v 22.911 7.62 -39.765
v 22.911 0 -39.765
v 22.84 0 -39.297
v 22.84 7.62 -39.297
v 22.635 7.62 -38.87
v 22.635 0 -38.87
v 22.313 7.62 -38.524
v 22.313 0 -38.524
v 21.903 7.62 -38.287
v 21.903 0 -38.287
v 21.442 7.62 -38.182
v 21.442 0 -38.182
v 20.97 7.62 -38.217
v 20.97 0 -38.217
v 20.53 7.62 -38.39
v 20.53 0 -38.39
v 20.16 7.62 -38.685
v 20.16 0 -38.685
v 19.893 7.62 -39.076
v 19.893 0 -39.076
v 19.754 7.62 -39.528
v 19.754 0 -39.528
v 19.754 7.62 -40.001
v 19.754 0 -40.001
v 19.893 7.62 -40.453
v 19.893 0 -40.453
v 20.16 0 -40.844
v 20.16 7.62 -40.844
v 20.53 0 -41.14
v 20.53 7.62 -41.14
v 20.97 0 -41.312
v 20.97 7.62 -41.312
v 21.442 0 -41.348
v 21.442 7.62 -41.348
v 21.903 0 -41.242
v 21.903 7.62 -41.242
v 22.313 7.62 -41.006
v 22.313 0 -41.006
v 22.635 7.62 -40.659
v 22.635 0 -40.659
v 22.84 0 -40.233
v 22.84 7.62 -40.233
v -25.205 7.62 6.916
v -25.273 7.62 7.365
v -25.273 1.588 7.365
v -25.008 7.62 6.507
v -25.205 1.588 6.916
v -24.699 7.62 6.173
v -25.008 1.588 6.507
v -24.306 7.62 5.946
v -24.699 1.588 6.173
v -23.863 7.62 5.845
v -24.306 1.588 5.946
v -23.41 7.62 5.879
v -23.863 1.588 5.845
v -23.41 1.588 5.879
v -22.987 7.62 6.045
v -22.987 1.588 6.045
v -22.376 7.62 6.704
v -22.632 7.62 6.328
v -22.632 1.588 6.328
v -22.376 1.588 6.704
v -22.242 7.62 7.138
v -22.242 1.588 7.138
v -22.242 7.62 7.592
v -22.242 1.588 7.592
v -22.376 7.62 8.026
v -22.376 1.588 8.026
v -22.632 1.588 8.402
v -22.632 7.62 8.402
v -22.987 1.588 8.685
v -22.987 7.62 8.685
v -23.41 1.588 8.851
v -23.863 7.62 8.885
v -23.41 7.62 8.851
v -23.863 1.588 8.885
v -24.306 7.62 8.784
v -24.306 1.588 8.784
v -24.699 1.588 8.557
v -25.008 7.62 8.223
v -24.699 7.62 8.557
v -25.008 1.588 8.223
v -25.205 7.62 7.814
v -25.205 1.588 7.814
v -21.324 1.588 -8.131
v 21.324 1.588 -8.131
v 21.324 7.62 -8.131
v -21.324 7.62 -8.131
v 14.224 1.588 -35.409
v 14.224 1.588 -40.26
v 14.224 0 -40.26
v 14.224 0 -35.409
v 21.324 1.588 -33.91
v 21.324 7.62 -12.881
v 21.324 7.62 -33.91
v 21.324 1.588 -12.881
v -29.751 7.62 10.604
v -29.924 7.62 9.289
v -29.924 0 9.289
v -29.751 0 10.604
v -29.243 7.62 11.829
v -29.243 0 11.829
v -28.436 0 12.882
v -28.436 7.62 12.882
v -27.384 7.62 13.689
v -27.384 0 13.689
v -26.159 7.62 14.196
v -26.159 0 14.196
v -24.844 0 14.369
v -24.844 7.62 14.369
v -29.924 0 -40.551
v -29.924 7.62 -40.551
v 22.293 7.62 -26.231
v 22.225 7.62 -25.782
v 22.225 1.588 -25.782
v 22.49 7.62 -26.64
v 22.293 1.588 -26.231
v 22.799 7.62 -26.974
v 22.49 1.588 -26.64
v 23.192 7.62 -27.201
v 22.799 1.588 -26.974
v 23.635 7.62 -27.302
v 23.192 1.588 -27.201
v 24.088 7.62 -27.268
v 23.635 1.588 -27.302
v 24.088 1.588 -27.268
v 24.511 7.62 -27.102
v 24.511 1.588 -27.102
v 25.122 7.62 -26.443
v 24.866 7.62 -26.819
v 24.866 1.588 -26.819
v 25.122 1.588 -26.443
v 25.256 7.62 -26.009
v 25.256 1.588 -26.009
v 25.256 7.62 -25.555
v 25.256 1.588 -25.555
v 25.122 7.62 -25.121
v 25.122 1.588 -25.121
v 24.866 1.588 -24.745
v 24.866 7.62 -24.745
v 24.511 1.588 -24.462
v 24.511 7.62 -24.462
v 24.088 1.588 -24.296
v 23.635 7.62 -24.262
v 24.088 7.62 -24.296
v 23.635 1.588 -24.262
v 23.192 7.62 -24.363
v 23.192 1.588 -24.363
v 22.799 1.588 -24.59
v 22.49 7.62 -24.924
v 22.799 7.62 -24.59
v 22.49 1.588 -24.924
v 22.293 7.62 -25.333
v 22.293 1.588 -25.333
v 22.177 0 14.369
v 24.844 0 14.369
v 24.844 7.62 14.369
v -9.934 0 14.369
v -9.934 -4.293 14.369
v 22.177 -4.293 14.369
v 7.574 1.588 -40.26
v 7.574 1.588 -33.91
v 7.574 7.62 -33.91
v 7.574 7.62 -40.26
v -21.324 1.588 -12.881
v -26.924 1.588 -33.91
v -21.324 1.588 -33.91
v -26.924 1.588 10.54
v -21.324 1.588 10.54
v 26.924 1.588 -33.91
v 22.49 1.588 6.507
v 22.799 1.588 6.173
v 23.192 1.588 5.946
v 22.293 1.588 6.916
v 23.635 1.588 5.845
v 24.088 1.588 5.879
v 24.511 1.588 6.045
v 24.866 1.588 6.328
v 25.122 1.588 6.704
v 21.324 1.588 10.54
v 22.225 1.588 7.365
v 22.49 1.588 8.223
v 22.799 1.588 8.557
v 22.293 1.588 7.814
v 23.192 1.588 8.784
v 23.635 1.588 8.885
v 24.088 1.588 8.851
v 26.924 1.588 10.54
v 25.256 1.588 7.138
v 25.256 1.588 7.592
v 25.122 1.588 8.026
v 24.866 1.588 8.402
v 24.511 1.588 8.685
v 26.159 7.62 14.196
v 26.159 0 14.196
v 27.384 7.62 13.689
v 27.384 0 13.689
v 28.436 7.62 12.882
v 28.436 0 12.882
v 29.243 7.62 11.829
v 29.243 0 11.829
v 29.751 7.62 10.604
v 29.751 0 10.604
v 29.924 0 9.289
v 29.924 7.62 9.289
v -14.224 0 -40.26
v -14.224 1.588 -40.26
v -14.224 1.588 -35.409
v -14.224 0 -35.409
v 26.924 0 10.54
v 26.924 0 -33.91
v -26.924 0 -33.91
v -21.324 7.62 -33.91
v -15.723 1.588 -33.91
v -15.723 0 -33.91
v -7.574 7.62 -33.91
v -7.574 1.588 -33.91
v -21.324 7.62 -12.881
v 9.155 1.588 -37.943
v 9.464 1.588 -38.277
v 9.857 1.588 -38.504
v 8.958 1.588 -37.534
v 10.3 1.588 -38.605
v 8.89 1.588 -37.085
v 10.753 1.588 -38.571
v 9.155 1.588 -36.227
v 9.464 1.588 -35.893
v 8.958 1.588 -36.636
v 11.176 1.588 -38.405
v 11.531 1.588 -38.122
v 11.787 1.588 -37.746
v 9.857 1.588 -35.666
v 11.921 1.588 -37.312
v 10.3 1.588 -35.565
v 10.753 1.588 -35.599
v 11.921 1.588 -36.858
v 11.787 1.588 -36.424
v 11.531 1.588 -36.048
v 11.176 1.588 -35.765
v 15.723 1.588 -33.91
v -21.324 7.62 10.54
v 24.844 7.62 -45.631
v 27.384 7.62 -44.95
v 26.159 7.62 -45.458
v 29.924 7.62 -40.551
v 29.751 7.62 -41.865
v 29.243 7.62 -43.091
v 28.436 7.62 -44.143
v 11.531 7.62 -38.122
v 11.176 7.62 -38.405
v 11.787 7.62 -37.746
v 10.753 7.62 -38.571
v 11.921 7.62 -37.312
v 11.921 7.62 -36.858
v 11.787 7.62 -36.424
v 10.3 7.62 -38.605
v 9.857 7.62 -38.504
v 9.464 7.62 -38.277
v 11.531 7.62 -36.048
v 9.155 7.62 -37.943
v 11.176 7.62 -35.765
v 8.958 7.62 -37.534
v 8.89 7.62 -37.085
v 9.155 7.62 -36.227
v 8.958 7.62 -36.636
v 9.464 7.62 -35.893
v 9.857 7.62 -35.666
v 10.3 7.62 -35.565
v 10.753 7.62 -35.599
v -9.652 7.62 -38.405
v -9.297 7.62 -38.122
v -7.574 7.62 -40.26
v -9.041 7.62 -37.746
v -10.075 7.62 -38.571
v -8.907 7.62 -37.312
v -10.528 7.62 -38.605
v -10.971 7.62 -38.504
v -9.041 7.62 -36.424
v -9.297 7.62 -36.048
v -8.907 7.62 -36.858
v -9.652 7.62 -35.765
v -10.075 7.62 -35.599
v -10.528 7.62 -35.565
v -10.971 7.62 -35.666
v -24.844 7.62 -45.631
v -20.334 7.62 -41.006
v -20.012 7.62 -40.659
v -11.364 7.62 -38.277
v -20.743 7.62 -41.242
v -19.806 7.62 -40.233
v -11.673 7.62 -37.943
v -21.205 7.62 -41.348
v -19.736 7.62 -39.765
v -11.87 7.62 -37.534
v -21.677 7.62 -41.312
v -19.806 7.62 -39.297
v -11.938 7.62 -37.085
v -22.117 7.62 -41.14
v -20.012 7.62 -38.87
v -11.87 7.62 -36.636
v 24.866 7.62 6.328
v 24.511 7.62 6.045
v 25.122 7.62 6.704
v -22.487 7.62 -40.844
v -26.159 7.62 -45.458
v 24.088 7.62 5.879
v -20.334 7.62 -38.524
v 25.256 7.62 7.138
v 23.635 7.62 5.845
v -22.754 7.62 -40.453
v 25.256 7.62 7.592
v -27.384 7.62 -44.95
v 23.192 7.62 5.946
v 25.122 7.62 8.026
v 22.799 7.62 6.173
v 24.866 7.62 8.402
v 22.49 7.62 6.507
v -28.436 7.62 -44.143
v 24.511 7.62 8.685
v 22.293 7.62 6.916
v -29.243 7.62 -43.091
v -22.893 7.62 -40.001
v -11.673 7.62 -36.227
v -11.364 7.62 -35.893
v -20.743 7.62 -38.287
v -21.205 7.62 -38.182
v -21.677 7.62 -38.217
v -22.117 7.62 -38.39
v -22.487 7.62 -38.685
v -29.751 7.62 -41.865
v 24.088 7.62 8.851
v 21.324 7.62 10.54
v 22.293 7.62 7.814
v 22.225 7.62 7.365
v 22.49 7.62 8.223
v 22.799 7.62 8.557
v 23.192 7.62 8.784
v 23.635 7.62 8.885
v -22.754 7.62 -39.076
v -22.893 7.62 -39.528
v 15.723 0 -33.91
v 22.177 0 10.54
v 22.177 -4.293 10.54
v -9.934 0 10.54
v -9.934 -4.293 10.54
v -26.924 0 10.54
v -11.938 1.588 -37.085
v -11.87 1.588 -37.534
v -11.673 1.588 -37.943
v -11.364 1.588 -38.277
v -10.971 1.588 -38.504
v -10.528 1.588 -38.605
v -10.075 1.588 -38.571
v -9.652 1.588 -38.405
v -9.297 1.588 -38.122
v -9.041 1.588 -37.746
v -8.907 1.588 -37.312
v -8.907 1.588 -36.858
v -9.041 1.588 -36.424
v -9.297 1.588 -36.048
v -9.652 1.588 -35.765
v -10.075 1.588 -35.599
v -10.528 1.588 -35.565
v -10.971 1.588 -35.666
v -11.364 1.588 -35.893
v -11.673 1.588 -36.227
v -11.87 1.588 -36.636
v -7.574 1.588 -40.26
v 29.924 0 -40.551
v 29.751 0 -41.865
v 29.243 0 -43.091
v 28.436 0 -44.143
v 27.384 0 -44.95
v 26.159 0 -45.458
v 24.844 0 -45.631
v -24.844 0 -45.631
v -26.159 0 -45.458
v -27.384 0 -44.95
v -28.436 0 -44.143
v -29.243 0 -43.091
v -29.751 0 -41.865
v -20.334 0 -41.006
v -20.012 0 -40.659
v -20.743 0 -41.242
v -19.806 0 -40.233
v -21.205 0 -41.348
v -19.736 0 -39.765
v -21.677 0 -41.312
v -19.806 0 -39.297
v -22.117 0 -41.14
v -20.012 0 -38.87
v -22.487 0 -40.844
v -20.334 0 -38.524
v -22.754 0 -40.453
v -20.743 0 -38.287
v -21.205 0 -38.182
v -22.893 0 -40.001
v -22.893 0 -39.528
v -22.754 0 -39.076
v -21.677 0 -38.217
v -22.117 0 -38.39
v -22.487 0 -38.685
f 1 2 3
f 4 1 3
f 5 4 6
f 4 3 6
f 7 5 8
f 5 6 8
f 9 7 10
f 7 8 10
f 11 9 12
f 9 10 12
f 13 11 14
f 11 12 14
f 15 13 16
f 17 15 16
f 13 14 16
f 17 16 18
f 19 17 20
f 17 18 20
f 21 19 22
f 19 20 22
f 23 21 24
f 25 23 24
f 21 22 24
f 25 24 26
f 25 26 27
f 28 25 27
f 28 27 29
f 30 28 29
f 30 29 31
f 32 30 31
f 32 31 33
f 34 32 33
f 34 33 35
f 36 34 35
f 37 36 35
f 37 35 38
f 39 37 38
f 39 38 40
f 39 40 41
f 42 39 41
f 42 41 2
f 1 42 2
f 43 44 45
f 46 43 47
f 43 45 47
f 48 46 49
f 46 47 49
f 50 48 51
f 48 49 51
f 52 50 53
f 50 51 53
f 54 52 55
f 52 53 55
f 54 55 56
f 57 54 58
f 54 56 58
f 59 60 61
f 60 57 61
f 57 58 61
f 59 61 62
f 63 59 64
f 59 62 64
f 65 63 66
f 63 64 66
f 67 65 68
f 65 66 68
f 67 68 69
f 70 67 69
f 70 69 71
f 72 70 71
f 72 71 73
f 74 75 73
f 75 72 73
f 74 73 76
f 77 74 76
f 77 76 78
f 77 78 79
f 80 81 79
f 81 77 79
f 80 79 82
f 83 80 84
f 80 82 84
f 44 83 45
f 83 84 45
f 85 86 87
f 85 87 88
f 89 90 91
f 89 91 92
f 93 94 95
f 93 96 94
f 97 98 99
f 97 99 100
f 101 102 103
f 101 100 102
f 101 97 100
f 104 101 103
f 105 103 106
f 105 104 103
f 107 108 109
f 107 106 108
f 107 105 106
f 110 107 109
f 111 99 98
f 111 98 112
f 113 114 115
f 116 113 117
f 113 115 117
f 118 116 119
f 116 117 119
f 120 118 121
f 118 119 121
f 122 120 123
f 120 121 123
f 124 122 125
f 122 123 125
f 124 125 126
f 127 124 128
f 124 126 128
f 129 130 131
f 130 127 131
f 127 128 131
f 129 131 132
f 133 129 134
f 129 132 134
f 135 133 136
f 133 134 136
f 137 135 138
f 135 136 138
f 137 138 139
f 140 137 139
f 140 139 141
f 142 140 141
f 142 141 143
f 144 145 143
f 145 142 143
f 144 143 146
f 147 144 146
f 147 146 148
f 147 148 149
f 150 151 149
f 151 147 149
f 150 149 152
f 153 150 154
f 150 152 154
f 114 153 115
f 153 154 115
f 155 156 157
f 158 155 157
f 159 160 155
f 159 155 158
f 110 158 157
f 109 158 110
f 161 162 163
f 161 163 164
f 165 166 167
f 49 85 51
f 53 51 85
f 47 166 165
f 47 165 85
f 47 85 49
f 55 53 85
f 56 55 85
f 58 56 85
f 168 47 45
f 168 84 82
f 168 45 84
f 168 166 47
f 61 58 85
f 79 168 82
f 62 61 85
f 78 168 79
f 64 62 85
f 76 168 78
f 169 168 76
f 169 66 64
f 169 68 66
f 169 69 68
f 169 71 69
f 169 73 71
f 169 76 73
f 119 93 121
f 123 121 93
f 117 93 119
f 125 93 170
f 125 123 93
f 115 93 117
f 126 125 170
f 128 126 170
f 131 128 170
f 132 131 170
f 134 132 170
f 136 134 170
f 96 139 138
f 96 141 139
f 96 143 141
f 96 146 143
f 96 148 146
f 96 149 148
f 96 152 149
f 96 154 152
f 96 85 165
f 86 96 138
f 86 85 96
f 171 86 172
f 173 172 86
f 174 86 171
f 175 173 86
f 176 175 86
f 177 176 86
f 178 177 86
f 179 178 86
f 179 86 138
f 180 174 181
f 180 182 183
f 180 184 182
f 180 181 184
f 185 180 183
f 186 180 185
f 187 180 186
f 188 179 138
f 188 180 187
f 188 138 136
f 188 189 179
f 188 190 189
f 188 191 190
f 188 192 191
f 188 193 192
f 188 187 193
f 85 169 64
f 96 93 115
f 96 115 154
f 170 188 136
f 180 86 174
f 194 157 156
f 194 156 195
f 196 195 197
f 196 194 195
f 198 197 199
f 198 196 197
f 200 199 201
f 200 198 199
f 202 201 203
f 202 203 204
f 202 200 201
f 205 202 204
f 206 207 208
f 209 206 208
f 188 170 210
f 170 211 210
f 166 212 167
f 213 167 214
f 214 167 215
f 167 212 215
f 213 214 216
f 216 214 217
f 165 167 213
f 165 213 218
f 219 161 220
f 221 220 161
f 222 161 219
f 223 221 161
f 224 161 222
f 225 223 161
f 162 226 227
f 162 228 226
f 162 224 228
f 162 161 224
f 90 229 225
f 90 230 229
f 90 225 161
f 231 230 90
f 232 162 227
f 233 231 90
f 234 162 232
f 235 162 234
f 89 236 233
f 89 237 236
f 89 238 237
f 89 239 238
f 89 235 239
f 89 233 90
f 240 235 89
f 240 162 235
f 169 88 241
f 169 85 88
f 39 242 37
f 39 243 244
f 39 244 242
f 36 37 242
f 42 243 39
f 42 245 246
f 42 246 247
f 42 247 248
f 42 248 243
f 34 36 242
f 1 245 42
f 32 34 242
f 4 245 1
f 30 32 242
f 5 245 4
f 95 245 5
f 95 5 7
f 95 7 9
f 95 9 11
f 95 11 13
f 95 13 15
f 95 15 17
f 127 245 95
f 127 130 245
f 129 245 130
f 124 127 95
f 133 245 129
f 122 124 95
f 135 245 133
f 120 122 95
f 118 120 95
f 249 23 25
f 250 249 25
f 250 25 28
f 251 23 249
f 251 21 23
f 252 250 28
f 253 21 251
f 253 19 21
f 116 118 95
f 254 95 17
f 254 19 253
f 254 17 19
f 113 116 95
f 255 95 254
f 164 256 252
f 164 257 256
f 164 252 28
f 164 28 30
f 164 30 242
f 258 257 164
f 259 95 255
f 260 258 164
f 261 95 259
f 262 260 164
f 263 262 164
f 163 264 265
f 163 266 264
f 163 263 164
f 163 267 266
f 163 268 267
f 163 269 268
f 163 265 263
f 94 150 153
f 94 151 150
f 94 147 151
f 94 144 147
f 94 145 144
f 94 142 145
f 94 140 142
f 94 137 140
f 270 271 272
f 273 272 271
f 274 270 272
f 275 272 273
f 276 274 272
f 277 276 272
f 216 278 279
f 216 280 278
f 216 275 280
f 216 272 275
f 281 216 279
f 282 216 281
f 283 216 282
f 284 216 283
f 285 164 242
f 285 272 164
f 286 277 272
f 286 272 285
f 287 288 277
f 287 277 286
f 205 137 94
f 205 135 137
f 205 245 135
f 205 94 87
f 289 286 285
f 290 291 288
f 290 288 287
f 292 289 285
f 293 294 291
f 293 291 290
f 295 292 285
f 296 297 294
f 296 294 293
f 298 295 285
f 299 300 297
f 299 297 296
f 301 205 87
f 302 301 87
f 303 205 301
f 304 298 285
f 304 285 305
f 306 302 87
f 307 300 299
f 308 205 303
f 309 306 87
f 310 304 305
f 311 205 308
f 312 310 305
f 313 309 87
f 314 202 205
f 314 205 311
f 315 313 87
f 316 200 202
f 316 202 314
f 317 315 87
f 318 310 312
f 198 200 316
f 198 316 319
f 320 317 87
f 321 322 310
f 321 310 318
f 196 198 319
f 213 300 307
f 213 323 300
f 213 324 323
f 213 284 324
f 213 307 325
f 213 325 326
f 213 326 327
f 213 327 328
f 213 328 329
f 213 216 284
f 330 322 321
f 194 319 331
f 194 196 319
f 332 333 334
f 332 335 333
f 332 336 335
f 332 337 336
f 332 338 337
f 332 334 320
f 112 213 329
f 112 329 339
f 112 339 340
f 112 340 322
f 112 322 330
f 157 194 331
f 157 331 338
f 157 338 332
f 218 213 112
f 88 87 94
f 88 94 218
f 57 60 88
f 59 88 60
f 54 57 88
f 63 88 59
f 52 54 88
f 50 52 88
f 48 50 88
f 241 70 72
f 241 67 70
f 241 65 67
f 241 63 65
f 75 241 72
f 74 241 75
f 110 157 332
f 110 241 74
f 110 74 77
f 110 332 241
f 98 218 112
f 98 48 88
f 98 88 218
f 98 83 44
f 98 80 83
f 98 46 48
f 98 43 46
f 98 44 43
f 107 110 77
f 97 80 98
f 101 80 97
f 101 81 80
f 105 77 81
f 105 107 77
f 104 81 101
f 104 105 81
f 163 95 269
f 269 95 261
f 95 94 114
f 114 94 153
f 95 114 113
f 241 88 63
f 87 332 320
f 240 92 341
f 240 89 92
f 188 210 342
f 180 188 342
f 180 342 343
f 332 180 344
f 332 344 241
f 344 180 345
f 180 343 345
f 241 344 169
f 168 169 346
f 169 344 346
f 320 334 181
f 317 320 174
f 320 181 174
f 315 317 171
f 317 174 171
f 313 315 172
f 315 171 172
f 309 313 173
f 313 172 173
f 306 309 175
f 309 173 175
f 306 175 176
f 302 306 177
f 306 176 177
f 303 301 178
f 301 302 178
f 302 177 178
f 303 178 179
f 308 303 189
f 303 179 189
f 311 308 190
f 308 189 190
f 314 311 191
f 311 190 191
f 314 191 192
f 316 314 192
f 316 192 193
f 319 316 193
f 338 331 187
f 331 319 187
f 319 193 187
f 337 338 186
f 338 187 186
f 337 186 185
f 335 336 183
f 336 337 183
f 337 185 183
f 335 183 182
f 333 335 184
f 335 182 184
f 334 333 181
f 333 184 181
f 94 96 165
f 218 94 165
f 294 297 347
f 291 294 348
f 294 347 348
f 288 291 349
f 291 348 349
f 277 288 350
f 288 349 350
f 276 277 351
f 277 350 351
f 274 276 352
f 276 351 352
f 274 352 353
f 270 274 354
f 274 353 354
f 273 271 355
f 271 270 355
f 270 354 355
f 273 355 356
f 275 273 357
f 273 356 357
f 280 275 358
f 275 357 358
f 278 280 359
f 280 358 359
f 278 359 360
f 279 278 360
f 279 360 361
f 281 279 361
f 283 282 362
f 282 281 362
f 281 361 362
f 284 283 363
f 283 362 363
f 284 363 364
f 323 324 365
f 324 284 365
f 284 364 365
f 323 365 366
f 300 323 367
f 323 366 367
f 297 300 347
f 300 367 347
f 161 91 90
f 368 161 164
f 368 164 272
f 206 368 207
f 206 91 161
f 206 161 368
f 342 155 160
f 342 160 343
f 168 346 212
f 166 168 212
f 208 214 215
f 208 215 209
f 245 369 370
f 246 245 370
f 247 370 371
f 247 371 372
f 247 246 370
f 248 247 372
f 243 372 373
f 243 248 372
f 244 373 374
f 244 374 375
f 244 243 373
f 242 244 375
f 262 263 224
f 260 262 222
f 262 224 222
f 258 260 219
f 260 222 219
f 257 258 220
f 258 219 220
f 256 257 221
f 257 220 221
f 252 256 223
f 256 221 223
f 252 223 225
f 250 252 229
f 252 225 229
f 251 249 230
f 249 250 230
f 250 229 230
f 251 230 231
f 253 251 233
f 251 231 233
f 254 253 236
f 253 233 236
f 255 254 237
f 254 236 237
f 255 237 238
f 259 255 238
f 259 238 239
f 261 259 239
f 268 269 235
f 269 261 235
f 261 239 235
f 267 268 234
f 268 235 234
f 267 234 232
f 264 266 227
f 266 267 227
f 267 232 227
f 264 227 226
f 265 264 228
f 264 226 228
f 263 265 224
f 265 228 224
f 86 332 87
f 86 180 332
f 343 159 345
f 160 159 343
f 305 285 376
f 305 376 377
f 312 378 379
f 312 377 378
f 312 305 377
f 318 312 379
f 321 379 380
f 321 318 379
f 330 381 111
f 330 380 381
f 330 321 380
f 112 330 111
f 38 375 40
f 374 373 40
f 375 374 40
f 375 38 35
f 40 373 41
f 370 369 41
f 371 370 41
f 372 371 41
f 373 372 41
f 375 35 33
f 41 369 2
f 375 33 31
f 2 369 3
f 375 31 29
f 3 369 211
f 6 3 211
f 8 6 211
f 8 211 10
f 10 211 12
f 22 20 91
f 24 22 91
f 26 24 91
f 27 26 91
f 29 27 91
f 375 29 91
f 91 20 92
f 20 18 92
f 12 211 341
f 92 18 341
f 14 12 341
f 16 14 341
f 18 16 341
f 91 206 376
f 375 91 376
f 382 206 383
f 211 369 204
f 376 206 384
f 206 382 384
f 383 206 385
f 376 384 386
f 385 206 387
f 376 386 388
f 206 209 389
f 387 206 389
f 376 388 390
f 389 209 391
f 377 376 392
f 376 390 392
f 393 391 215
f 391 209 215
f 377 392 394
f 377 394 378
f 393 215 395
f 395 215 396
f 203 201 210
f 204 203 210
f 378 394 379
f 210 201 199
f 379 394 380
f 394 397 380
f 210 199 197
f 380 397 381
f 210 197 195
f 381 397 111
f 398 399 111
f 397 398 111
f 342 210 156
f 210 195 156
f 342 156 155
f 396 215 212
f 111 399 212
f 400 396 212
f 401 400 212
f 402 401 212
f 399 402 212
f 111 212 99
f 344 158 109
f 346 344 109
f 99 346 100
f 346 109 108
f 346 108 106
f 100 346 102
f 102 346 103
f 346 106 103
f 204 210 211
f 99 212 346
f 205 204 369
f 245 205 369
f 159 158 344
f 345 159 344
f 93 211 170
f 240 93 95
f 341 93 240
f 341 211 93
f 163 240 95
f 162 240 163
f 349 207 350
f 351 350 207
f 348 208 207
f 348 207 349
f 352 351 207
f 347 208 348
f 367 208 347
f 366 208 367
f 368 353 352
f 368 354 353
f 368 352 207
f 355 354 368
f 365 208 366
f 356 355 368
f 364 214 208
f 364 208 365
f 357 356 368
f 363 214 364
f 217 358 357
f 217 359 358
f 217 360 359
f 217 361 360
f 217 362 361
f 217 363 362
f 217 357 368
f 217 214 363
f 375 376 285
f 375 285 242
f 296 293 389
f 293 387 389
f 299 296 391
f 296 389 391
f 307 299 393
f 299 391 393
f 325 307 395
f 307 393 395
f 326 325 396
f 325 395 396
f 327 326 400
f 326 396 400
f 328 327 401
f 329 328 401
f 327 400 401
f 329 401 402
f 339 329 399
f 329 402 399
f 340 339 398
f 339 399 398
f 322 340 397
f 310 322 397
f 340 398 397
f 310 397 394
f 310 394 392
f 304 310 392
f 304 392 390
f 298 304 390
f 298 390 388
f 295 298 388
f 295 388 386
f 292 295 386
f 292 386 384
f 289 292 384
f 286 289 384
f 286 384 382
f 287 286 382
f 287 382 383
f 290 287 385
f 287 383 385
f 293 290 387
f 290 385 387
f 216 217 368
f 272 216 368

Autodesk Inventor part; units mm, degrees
ref_plane "YZ Plane" through (0, 0, 0) normal (1, 0, 0) x (0, 1, 0)
ref_plane "XZ Plane" through (0, 0, 0) normal (0, 1, 0) x (-1, 0, 0)
ref_plane "XY Plane" through (0, 0, 0) normal (0, 0, 1) x (1, 0, 0)
sketch "Sketch1" plane through (0, 0, 0) normal (0, 1, 0) x (-1, 0, 0)
  line L0 (21.324, 10.54) -> (-21.324, 10.54)
  line L1 (-21.324, -33.91) -> (-15.724, -33.91)
  circle A0 centre (-23.749, -25.782) radius 1.524
  circle A1 centre (-23.749, 7.365) radius 1.524
  circle A2 centre (23.749, 7.365) radius 1.524
  circle A3 centre (10.414, -37.085) radius 1.524
  circle A4 centre (-10.414, -37.085) radius 1.524
  line L2 (-29.924, 14.3694) -> (-29.924, -45.6306)
  line L3 (29.924, 14.3694) -> (29.924, -45.6306)
  line L4 (-29.924, 14.3694) -> (29.924, 14.3694)
  line L5 (-21.324, -33.91) -> (-7.574, -33.91)
  line L6 (-7.574, -33.91) -> (-7.574, -40.26)
  line L7 (-7.574, -40.26) -> (7.574, -40.26)
  line L8 (29.924, -45.6306) -> (-29.924, -45.6306)
  line L9 (-21.324, 10.54) -> (21.324, 10.54)
  circle A5 centre (-23.749, 7.365) radius 1.524
  circle A6 centre (23.749, 7.365) radius 1.524
  circle A7 centre (-23.749, -25.782) radius 1.524
  circle A8 centre (10.414, -37.085) radius 1.524
  circle A9 centre (-10.414, -37.085) radius 1.524
  line L10 (-21.324, -8.1306) -> (21.324, -8.1306)
  line L11 (-21.324, -12.8806) -> (21.324, -12.8806)
  line L12 (-21.324, 10.54) -> (-21.324, -8.1306)
  line L13 (-21.324, -12.8806) -> (-21.324, -33.91)
  line L14 (21.324, -33.91) -> (21.324, -12.8806)
  line L15 (21.324, -8.1306) -> (21.324, 10.54)
  line L16 (21.324, -33.91) -> (7.574, -33.91)
  line L17 (7.574, -33.91) -> (7.574, -40.26)
  point P0 (0, 0)
  point P1 (-14.449, -33.91)
  dimension "d6" = 60
  dimension "d9" = 13.75
  dimension "d11" = 56.1706
  dimension "d12" = 37.5
  dimension "d13" = 32.75
  dimension "d14" = 51.248
  dimension "d15" = 8.6
extrude "Extrusion1" add sketch "Sketch1" along normal blind 7.62
sketch "Sketch2" plane through (0, 0, 0) normal (0, -1, 0) x (1, 0, 0)
  line L0 (21.324, 10.54) -> (-21.324, 10.54) projected
  line L1 (0, 10.54) -> (-26.924, 10.54)
  line L2 (-26.924, 10.54) -> (-26.924, -40.26)
  line L3 (-26.924, -40.26) -> (26.924, -40.26)
  line L4 (26.924, -40.26) -> (26.924, 10.54)
  line L5 (26.924, 10.54) -> (0, 10.54)
  point P0 (0, 0)
  dimension "d18" = 26.924
  dimension "d19" = 50.8
  dimension "d20" = 53.848
extrude "Extrusion2" cut sketch "Sketch2" against normal blind 1.5875
fillet "Fillet1" radius 5.08 4 edges at (29.924, 3.81, 14.3694) (-29.924, 3.81, 14.3694) (29.924, 3.81, -45.6306) (-29.924, 3.81, -45.6306)
sketch "Sketch3" plane through (0, 0, 0) normal (0, -1, 0) x (1, 0, 0)
  line L0 (-24.844, 14.3694) -> (24.844, 14.3694) projected
  line L1 (-9.9342, 14.3694) -> (-9.9342, 10.54)
  line L2 (-29.924, -40.5506) -> (-29.924, 9.2894) projected
  line L3 (22.177, 14.3694) -> (22.177, 10.54)
  line L4 (-26.924, 10.54) -> (26.924, 10.54) projected
  line L5 (29.924, 9.2894) -> (29.924, -40.5506) projected
  line L6 (-9.9342, 14.3694) -> (22.177, 14.3694)
  line L7 (22.177, 10.54) -> (-9.9342, 10.54)
  point P0 (0, 0)
  dimension "d24" = 19.9898
  dimension "d25" = 7.747
extrude "Extrusion3" add sketch "Sketch3" along normal blind 4.2926
sketch "Sketch4" plane through (0, 1.5875, 0) normal (0, -1, 0) x (1, 0, 0)
  line L0 (21.324, -33.91) -> (21.324, -12.8806) projected
  line L1 (26.924, -40.26) -> (-26.924, -40.26) projected
  line L2 (-21.324, -33.91) -> (-7.574, -33.91) projected
  line L3 (-26.924, -40.26) -> (-14.224, -40.26)
  line L4 (-15.7226, -33.91) -> (-26.924, -33.91)
  line L5 (-26.924, -33.91) -> (-26.924, -40.26)
  line L6 (7.574, -33.91) -> (21.324, -33.91) projected
  line L7 (26.924, -40.26) -> (14.224, -40.26)
  line L8 (15.7226, -33.91) -> (26.924, -33.91)
  line L9 (26.924, -33.91) -> (26.924, -40.26)
  line L10 (-14.224, -40.26) -> (-14.224, -35.4086)
  circle A0 centre (-10.414, -37.085) radius 1.524 projected
  line L11 (-15.7226, -33.91) -> (-14.224, -35.4086)
  line L12 (14.224, -40.26) -> (14.224, -35.4086)
  circle A1 centre (10.414, -37.085) radius 1.524 projected
  line L13 (14.224, -35.4086) -> (15.7226, -33.91)
  point P0 (0, 0)
  dimension "d42" = 11.2014
  dimension "d43" = 11.2014
  dimension "d44" = 4.8514
  dimension "d45" = 3.81
  dimension "d46" = 4.8514
  dimension "d48" = 3.81
  dimension "d49" = 6.35
  dimension "d50" = 6.35
extrude "Extrusion4" add sketch "Sketch4" along normal blind 1.5875 contours L1 L5 L4 L2 L11 L10 | L1 L12 L13 L6 L8 L9
sketch "Sketch5" plane through (0, 0, 0) normal (0, -1, 0) x (1, 0, 0)
  line L0 (-14.224, -40.26) -> (-14.224, -35.4086) projected
  line L1 (-15.7226, -33.91) -> (-26.924, -33.91) projected
  line L2 (-26.924, -33.91) -> (-26.924, 10.54) projected
  line L3 (0, -57.6306) -> (0, 26.3694) projected
  line L4 (-26.924, 10.54) -> (-9.9342, 10.54) projected
  line L5 (-24.844, 14.3694) -> (-9.9342, 14.3694) projected
  line L6 (-29.924, -40.5506) -> (-29.924, 9.2894) projected
  circle A0 centre (-21.3233, -39.7647) radius 1.5875
  circle A1 centre (21.3233, -39.7647) radius 1.5875
  point P0 (0, 0)
  dimension "d101" = 3.175
  dimension "d102" = 5.8547
  dimension "d104" = 7.0993
extrude "Extrusion6" cut sketch "Sketch5" against normal up to next
properties part number "front-cam"
